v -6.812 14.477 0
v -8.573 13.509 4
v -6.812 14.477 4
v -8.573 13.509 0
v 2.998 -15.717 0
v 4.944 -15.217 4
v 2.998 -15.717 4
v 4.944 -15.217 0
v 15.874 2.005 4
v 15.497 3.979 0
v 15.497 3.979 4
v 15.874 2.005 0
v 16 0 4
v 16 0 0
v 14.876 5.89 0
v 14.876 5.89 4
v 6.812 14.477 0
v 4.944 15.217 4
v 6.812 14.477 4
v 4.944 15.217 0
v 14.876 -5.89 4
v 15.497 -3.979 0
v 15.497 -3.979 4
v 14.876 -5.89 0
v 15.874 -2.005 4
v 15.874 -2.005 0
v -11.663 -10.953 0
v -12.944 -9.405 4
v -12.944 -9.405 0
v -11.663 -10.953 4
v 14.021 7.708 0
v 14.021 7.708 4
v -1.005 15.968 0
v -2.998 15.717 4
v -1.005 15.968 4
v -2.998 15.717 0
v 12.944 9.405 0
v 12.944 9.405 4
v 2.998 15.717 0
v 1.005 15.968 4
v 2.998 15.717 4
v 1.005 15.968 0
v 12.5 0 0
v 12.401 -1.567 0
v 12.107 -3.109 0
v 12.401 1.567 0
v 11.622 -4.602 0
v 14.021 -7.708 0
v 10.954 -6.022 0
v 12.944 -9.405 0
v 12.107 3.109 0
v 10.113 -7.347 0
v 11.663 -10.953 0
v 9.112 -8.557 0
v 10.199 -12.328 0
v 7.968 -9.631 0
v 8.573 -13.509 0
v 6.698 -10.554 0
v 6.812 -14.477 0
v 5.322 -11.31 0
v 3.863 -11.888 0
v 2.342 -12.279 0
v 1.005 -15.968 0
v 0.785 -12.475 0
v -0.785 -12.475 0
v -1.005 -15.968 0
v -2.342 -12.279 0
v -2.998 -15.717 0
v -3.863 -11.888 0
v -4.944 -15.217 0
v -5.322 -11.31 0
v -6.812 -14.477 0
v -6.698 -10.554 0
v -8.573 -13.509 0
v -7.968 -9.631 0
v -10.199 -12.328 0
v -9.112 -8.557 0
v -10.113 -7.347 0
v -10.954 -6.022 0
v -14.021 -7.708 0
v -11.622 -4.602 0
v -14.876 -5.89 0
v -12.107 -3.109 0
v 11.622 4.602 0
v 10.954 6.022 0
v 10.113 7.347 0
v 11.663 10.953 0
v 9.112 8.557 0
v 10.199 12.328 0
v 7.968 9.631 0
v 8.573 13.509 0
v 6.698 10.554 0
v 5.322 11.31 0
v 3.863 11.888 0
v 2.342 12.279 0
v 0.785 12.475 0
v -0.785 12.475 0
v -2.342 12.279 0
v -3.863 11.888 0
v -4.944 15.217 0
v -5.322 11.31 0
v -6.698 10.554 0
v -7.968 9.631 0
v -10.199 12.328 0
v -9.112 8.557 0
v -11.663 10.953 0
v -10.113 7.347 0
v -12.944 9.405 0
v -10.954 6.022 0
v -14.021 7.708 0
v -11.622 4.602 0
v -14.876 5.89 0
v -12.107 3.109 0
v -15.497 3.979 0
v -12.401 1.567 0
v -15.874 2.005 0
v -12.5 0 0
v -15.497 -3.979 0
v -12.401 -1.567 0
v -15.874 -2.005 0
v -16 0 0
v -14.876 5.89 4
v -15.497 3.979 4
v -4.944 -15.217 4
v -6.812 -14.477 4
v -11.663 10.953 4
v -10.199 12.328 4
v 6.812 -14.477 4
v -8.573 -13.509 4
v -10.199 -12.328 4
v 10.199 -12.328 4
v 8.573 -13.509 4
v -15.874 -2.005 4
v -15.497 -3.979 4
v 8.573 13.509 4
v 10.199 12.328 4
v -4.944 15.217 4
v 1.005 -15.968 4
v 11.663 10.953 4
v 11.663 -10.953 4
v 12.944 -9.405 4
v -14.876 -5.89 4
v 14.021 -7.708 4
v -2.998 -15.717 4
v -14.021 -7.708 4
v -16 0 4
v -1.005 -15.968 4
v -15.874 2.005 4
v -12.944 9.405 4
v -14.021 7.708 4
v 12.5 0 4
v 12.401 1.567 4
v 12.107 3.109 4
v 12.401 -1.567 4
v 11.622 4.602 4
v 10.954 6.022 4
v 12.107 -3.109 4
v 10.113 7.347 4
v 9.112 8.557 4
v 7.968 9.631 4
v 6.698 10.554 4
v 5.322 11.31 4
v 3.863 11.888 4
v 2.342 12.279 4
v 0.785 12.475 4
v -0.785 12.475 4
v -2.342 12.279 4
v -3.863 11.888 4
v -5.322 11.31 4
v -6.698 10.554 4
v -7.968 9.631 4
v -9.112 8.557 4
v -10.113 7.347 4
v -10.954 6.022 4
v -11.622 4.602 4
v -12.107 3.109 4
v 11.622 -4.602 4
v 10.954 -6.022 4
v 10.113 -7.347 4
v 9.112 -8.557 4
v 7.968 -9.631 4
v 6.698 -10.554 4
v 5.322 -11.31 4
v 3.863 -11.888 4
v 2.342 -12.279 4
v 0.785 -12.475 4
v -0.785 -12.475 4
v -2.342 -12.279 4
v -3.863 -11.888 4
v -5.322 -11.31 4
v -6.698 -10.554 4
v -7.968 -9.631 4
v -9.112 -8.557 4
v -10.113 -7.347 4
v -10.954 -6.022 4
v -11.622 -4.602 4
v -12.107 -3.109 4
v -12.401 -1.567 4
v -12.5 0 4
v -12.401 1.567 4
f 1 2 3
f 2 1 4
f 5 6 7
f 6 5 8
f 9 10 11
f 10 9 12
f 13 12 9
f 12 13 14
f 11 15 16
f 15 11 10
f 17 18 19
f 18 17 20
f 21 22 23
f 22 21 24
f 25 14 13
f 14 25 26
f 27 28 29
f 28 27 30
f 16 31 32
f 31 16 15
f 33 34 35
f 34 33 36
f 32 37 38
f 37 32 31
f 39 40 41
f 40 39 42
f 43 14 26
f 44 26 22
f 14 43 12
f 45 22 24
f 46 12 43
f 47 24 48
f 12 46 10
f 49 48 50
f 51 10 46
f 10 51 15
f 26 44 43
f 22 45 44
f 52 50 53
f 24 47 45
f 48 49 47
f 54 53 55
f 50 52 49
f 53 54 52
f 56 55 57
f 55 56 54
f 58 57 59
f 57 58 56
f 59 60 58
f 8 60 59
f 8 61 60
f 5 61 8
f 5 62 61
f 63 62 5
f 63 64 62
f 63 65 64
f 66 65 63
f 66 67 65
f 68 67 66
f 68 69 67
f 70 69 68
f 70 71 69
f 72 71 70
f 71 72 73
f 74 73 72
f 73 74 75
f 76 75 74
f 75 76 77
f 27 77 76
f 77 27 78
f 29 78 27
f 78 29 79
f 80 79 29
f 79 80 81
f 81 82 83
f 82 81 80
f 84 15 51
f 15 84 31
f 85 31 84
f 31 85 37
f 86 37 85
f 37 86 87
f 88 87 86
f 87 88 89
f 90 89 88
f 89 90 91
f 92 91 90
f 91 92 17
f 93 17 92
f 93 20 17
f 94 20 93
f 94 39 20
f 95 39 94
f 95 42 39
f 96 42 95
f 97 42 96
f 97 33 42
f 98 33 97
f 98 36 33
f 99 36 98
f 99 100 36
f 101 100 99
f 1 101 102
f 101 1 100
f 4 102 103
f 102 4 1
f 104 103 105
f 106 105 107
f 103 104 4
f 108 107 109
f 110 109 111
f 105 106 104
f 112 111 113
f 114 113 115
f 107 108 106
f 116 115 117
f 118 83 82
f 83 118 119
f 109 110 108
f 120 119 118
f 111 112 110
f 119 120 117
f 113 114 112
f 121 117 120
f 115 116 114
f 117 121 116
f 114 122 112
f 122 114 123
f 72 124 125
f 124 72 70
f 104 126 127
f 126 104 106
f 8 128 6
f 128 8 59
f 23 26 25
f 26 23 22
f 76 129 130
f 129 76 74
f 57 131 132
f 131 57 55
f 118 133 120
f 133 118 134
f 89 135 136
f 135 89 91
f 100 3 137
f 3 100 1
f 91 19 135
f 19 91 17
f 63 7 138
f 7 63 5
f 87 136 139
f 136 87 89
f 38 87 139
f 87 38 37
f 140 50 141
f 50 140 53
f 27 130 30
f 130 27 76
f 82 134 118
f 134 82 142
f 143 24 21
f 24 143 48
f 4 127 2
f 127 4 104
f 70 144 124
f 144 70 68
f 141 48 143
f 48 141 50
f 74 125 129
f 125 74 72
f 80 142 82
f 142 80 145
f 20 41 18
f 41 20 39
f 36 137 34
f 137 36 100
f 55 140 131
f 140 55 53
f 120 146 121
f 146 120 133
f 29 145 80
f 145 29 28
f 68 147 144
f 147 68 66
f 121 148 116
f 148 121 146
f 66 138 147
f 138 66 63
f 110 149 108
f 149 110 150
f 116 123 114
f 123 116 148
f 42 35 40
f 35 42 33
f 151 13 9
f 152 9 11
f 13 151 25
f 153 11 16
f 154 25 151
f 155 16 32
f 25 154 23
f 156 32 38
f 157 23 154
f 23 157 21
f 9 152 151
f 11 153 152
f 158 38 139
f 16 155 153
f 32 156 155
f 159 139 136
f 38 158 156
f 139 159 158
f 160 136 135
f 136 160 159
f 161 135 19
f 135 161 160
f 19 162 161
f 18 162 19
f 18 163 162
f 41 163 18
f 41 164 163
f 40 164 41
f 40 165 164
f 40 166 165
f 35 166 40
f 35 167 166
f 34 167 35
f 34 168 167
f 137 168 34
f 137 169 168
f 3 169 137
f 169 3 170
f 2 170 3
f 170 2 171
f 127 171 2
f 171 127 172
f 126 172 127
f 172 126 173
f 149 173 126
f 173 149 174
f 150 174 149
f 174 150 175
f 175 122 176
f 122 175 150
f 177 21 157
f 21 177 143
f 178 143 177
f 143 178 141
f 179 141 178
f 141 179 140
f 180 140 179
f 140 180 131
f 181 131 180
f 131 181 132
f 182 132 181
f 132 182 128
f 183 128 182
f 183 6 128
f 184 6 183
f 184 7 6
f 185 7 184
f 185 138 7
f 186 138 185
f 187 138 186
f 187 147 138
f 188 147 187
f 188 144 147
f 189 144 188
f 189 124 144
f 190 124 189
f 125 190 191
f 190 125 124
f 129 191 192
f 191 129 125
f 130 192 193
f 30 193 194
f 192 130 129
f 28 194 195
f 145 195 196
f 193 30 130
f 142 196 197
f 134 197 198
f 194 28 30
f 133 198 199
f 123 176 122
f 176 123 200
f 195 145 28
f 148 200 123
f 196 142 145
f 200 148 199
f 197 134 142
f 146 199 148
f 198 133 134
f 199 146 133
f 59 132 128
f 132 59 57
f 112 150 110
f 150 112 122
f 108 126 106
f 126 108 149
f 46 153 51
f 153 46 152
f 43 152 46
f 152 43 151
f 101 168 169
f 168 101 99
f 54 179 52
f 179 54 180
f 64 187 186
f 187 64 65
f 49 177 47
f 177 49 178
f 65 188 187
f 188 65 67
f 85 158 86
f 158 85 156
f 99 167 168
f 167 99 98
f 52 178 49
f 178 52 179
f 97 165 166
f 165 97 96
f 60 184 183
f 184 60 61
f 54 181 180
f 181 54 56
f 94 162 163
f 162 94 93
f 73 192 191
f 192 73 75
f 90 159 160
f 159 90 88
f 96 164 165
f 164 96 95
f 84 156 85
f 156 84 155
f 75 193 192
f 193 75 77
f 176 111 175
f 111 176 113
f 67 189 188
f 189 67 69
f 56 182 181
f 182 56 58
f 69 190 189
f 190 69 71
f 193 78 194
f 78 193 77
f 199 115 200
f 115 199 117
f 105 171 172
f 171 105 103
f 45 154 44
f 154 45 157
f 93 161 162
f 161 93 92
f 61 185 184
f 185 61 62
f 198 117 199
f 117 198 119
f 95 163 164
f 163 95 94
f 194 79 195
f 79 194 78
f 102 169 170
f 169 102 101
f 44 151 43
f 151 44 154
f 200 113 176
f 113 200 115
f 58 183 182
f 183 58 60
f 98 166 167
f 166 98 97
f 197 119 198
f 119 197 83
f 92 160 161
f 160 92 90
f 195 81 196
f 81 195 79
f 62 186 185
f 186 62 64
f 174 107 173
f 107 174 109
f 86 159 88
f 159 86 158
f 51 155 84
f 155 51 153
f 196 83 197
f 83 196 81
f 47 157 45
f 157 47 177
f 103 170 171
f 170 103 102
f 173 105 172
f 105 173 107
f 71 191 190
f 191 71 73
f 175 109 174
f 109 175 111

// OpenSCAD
$fn = 50;


difference() {
	union() {
		translate(v = [0, 0, 0]) {
			rotate(a = [0, 0, 0]) {
				cylinder(h = 4, r = 16.0000000000);
			}
		}
	}
	union() {
		translate(v = [0, 0, 0]) {
			rotate(a = [0, 0, 0]) {
				cylinder(h = 4, r = 12.5000000000);
			}
		}
	}
}
